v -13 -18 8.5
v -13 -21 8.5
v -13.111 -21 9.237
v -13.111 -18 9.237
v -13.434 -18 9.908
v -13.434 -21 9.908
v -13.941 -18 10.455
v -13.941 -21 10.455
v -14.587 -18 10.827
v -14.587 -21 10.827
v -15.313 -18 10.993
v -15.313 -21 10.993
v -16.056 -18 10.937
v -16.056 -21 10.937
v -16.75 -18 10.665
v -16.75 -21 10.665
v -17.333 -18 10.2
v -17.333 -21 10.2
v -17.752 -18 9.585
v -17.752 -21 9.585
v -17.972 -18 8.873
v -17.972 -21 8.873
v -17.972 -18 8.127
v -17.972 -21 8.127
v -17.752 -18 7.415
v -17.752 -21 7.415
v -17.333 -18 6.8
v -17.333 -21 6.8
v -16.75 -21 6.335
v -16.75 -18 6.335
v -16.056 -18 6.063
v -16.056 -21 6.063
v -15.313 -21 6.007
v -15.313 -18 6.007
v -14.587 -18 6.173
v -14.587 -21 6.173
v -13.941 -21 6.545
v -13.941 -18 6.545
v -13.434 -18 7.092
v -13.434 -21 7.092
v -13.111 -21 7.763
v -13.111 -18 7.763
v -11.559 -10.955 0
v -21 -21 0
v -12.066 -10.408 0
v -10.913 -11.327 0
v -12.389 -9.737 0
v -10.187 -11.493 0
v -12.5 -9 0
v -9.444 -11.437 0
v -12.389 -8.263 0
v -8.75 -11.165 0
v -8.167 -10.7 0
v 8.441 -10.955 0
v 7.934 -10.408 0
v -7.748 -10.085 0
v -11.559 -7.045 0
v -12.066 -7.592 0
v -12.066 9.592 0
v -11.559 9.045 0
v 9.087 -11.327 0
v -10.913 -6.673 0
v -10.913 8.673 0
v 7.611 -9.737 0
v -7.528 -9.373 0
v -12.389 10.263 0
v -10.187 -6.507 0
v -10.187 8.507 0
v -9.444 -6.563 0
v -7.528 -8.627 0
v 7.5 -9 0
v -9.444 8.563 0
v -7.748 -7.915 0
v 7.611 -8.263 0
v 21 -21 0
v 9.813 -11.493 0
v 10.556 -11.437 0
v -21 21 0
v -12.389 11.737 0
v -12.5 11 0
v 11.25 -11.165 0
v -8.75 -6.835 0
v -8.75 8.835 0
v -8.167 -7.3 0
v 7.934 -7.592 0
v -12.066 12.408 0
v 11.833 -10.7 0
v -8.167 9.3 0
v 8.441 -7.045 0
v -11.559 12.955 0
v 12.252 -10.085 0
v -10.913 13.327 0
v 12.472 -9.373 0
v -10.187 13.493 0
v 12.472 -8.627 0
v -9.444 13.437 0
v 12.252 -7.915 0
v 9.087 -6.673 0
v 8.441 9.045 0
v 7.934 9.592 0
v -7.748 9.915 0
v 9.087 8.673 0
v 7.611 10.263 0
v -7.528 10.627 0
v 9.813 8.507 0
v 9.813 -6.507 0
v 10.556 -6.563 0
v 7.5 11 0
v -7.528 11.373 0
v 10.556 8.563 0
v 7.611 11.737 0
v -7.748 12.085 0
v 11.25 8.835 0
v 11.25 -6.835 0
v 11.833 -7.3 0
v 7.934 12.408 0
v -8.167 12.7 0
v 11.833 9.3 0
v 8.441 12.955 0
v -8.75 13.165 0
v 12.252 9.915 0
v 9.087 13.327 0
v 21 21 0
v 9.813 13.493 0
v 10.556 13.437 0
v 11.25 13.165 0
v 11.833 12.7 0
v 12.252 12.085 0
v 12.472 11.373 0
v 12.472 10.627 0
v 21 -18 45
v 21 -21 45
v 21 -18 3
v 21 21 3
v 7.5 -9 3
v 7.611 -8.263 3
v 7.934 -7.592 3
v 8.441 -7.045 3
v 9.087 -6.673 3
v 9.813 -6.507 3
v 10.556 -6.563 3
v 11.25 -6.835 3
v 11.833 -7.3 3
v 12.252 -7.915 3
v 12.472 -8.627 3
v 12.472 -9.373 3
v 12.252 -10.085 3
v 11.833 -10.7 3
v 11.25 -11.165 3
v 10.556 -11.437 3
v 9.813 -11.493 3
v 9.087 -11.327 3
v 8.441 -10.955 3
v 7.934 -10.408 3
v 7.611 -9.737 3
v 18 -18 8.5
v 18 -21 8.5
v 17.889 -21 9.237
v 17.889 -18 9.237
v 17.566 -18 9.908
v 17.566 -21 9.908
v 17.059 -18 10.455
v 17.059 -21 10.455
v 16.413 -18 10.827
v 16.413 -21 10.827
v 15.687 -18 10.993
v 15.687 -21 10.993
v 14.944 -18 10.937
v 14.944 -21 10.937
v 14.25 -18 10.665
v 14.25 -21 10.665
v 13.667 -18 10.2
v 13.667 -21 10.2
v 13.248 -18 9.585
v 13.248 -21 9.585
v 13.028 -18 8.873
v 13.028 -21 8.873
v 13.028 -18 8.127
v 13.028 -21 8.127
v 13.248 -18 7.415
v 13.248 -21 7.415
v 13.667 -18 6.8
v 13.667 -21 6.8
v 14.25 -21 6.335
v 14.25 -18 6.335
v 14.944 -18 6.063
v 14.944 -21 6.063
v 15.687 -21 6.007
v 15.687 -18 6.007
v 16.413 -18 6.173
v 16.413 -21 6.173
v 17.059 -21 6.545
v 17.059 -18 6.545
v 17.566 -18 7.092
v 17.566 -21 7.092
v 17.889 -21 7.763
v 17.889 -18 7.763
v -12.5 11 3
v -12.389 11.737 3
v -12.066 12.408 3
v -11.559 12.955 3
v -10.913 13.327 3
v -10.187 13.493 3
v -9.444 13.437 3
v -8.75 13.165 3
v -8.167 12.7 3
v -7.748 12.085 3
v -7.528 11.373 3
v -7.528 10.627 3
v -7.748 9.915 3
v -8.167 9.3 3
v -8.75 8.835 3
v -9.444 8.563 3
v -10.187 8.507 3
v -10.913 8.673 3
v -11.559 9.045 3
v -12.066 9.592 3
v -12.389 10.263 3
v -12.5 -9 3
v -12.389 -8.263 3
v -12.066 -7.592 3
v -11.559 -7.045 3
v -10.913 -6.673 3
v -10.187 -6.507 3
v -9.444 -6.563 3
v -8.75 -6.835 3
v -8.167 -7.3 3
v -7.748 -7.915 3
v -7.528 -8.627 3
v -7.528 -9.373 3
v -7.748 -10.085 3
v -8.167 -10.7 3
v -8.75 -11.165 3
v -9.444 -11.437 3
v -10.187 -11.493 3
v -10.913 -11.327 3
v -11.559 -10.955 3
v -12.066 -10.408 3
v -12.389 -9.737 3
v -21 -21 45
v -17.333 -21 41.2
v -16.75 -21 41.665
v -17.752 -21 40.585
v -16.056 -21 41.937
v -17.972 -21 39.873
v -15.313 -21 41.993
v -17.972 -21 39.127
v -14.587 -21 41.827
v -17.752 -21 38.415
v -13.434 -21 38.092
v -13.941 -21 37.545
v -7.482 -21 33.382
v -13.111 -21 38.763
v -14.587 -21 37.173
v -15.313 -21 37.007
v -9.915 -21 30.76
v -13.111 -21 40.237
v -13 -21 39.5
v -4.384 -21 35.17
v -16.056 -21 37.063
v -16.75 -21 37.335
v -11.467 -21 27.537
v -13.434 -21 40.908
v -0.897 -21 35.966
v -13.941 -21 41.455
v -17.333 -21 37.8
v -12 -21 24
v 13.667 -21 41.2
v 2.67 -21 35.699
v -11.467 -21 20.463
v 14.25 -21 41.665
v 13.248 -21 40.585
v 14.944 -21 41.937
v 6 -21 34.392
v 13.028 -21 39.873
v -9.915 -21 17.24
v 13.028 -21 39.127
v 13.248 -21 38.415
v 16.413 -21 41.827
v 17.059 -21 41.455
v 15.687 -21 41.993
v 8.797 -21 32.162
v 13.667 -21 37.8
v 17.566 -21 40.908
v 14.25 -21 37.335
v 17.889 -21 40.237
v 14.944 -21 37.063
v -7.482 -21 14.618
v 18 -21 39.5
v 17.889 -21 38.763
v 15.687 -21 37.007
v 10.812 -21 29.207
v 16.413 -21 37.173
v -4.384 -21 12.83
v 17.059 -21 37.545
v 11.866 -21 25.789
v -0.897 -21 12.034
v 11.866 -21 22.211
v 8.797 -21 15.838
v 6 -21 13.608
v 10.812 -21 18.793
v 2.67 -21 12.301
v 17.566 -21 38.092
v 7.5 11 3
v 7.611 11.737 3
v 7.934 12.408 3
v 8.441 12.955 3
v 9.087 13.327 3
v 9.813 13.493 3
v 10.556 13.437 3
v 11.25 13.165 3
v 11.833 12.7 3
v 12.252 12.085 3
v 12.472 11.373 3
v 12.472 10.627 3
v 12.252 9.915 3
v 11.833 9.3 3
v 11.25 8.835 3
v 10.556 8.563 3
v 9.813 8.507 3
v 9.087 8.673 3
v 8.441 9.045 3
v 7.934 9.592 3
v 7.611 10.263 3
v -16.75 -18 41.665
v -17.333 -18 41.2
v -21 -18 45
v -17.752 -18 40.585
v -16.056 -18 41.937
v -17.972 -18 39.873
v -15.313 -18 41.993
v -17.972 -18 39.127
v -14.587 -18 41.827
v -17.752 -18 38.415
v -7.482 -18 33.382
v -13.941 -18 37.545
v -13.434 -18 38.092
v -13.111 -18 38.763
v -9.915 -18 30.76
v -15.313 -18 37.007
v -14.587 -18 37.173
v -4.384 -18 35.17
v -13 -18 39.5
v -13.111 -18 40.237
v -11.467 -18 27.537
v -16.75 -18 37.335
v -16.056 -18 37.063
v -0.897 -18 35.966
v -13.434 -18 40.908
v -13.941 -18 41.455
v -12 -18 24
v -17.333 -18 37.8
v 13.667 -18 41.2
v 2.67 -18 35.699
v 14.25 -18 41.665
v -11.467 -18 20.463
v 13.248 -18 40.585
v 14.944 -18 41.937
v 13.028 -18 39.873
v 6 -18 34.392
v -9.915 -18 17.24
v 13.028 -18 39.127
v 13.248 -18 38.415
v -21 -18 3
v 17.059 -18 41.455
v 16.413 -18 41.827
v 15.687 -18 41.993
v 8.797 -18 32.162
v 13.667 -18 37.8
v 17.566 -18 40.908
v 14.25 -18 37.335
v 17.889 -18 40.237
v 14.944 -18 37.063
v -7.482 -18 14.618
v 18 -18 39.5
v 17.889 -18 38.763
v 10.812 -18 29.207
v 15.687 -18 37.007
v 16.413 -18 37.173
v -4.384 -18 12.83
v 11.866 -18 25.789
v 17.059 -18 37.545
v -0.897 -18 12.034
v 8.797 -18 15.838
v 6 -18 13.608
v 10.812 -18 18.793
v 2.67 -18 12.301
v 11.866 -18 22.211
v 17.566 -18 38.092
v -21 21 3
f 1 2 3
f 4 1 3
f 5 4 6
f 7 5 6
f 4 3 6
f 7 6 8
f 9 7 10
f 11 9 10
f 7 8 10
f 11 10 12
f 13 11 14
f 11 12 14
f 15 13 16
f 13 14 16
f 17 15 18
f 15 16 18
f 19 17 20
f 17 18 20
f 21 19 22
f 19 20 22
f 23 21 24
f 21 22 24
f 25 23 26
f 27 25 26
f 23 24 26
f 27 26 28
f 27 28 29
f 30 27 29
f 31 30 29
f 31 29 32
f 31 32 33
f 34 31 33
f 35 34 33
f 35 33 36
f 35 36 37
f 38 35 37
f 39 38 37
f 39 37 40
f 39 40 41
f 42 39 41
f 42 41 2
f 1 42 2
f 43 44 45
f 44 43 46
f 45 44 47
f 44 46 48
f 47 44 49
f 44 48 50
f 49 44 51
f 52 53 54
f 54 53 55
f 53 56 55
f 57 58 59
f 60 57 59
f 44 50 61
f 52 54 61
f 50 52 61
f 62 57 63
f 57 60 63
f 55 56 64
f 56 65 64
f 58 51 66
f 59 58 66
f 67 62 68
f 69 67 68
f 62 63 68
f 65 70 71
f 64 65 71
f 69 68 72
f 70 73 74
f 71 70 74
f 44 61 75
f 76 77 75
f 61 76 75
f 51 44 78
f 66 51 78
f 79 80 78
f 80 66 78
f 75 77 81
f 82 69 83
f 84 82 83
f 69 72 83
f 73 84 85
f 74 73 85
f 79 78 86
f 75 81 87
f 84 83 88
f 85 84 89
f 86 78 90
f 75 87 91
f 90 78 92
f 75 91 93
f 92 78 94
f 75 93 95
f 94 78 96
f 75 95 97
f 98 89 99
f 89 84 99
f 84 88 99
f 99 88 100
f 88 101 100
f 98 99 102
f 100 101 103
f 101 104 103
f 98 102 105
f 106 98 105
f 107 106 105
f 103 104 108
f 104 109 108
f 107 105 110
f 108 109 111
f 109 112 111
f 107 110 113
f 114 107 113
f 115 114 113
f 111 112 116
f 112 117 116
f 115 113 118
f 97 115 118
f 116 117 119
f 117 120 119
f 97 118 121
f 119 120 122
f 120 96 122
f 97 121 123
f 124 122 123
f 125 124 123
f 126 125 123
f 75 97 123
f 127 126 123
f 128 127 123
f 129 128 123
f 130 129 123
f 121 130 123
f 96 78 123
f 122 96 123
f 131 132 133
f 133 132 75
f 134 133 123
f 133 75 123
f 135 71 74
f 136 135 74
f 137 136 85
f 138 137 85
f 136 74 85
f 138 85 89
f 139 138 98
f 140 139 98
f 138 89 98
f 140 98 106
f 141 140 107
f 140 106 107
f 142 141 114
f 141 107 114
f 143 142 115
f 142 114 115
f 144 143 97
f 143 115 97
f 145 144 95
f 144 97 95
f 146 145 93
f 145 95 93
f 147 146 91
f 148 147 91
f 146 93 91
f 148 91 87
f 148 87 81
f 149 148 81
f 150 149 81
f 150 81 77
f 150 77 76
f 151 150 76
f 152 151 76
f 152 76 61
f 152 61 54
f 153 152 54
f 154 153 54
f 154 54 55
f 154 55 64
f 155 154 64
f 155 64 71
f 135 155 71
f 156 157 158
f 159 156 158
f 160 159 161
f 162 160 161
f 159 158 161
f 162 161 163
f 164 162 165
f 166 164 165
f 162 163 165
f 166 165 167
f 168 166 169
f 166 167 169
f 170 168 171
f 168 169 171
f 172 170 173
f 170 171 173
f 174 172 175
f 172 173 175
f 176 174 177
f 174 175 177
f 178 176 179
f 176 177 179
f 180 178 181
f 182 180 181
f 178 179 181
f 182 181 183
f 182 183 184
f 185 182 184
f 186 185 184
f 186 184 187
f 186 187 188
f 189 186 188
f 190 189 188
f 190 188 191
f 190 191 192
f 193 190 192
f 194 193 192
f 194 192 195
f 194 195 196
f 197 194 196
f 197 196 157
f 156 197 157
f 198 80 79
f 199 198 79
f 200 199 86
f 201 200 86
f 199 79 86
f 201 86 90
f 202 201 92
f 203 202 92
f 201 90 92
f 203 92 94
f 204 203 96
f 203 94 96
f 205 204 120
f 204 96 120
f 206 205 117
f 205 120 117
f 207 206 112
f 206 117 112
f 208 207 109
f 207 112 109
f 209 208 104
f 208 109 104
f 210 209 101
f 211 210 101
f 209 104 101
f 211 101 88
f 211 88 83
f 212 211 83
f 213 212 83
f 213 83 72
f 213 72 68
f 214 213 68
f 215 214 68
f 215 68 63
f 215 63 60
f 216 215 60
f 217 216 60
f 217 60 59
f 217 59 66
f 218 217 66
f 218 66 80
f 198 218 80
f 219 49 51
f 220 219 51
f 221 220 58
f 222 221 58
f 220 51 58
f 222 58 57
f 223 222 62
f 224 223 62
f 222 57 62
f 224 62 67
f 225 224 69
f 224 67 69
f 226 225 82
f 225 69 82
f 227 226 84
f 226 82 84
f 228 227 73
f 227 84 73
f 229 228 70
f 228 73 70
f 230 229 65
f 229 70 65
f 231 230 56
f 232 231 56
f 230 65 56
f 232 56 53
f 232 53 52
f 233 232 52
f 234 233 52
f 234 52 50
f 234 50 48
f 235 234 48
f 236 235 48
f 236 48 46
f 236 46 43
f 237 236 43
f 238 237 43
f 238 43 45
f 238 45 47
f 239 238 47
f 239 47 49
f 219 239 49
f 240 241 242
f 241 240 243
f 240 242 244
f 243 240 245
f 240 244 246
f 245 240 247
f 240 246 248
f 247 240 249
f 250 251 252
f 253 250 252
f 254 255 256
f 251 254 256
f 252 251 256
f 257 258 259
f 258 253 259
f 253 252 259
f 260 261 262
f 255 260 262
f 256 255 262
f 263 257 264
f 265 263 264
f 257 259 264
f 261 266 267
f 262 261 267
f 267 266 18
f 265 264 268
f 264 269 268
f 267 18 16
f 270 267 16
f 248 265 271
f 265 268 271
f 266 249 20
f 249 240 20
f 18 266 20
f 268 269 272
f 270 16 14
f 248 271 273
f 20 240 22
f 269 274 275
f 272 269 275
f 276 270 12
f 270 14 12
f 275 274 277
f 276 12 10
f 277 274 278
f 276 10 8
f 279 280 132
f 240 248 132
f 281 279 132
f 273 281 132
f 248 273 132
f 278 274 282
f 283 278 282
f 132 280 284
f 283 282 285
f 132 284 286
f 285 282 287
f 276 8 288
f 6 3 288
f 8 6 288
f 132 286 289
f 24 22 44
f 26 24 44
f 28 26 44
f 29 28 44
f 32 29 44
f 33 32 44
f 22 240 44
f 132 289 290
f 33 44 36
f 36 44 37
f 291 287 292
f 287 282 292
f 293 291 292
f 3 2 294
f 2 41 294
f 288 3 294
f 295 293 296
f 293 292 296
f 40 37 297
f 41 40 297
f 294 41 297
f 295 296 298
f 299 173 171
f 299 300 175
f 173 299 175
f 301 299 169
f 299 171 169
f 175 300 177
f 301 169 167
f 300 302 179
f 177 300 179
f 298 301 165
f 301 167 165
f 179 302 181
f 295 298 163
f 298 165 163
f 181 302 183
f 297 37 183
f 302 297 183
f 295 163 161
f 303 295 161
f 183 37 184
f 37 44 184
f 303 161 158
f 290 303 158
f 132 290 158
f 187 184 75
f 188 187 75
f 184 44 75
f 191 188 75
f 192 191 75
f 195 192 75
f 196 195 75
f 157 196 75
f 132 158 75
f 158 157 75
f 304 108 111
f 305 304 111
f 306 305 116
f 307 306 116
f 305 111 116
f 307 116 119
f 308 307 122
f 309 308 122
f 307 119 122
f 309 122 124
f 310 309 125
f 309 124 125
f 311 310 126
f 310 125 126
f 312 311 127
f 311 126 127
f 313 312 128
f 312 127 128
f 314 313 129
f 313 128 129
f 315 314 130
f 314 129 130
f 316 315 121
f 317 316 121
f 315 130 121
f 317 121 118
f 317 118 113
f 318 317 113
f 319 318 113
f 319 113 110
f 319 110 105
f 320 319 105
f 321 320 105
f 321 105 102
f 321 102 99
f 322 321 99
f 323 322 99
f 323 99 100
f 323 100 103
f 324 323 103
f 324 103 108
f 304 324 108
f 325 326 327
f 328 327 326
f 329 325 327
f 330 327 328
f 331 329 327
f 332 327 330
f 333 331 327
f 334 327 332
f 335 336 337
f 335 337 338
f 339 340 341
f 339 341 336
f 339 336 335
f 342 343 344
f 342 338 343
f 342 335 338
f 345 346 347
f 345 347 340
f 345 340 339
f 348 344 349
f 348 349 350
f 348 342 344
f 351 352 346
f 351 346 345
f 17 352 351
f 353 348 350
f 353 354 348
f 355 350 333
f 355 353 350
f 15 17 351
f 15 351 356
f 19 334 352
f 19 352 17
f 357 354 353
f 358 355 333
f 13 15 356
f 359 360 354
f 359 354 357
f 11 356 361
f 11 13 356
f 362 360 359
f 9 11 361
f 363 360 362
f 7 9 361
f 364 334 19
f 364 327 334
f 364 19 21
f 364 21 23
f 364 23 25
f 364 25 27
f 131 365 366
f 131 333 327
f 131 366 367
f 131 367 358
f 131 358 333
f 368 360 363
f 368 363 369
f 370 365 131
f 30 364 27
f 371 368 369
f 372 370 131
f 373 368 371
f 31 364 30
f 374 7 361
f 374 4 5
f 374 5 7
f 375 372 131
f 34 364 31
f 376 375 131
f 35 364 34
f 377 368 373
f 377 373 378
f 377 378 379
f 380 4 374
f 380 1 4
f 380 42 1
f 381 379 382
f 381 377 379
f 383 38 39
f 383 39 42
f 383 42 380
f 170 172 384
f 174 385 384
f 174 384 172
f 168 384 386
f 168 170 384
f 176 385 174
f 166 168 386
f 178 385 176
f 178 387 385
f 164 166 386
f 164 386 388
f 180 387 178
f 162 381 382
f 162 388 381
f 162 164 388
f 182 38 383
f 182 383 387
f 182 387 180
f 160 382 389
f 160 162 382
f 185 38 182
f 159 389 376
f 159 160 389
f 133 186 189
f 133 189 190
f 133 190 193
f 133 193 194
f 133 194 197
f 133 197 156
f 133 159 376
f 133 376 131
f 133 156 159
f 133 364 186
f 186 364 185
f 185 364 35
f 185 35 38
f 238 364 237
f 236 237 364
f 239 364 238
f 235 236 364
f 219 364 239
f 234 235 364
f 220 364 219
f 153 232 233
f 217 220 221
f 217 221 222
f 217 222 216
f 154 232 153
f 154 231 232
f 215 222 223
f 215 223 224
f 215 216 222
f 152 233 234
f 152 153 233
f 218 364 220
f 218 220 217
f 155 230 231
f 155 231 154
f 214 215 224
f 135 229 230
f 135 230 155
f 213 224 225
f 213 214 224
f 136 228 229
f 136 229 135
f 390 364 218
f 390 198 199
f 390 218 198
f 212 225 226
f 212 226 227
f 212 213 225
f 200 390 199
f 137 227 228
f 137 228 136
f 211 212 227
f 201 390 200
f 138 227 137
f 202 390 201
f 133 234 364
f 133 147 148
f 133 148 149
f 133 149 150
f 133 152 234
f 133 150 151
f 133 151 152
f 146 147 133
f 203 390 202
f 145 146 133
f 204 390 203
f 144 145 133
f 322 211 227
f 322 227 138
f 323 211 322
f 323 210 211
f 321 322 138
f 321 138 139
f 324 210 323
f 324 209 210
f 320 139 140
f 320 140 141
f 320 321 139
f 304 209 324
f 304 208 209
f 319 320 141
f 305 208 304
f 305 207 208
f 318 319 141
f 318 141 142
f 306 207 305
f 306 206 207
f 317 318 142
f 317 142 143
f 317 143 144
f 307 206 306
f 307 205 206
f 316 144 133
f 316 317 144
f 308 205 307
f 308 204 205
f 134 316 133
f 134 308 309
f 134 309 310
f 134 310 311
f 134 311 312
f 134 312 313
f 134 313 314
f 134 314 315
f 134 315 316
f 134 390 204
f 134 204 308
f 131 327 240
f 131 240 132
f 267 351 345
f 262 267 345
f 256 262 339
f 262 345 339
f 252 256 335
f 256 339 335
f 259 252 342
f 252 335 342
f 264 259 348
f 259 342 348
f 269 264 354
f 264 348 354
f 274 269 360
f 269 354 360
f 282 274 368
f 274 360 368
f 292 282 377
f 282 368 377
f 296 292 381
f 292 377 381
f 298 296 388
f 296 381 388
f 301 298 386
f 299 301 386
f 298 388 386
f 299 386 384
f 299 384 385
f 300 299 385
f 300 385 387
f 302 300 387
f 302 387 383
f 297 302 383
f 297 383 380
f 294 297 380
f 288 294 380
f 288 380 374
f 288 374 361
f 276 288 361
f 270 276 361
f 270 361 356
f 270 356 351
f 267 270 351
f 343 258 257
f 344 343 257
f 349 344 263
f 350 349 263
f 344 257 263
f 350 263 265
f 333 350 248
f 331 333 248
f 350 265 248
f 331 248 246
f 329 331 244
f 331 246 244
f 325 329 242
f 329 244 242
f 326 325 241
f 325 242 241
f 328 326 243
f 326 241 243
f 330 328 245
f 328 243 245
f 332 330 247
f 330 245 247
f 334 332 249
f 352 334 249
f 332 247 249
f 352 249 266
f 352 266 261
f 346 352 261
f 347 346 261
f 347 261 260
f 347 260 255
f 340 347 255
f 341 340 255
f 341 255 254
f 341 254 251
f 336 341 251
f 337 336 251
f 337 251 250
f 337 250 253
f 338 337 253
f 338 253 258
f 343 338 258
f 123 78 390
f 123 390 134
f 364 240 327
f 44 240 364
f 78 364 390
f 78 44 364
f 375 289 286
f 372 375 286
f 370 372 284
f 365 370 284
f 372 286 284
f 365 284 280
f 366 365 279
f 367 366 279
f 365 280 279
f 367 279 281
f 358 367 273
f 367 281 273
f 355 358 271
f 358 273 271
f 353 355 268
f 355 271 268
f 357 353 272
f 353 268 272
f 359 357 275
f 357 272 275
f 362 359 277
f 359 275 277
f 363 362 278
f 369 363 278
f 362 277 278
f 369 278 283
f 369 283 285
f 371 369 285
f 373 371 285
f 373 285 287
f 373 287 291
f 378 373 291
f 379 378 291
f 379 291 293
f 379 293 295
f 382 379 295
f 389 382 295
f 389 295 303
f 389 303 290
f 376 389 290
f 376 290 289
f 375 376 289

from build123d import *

# Parameters (mm, degrees)
F0_W     = 42
F0_H     = 39
F1_DEPTH = 3
F0_H_2   = 3
F2_DEPTH = 45
F4_D     = 5
F6_D     = 5
F7_R     = 12
F8_DEPTH = 25


with BuildPart() as f1:
    # F0 (on Top) → F1 (new body)
    with BuildSketch(Plane.XY):
        with Locations((0, 1.5)):
            Rectangle(F0_W, F0_H)
    extrude(amount=F1_DEPTH)

    # F0 (on Top) → F2 (join)
    with BuildSketch(Plane.XY):
        with Locations((0, -19.5)):
            Rectangle(F0_W, F0_H_2)
    extrude(amount=F2_DEPTH)

    # F4 (through all)
    with Locations(Plane.XY.offset(3)):
        with Locations((10, -9), (10, 11), (-10, 11), (-10, -9)):
            Hole(F4_D / 2)

    # F6 (through all)
    with Locations(Plane(origin=(0, -18, 0), x_dir=(-1, 0, 0), z_dir=(0, 1, 0))):
        with Locations((-15.5, 39.5), (-15.5, 8.5), (15.5, 8.5), (15.5, 39.5)):
            Hole(F6_D / 2)

    # F7 (on face) → F8 (cut)
    with BuildSketch(Plane(origin=(0, -18, 0), x_dir=(-1, 0, 0), z_dir=(0, 1, 0))):
        with Locations((0, 24)):
            Circle(F7_R)
    extrude(amount=-F8_DEPTH, mode=Mode.SUBTRACT)


solid = f1.part
